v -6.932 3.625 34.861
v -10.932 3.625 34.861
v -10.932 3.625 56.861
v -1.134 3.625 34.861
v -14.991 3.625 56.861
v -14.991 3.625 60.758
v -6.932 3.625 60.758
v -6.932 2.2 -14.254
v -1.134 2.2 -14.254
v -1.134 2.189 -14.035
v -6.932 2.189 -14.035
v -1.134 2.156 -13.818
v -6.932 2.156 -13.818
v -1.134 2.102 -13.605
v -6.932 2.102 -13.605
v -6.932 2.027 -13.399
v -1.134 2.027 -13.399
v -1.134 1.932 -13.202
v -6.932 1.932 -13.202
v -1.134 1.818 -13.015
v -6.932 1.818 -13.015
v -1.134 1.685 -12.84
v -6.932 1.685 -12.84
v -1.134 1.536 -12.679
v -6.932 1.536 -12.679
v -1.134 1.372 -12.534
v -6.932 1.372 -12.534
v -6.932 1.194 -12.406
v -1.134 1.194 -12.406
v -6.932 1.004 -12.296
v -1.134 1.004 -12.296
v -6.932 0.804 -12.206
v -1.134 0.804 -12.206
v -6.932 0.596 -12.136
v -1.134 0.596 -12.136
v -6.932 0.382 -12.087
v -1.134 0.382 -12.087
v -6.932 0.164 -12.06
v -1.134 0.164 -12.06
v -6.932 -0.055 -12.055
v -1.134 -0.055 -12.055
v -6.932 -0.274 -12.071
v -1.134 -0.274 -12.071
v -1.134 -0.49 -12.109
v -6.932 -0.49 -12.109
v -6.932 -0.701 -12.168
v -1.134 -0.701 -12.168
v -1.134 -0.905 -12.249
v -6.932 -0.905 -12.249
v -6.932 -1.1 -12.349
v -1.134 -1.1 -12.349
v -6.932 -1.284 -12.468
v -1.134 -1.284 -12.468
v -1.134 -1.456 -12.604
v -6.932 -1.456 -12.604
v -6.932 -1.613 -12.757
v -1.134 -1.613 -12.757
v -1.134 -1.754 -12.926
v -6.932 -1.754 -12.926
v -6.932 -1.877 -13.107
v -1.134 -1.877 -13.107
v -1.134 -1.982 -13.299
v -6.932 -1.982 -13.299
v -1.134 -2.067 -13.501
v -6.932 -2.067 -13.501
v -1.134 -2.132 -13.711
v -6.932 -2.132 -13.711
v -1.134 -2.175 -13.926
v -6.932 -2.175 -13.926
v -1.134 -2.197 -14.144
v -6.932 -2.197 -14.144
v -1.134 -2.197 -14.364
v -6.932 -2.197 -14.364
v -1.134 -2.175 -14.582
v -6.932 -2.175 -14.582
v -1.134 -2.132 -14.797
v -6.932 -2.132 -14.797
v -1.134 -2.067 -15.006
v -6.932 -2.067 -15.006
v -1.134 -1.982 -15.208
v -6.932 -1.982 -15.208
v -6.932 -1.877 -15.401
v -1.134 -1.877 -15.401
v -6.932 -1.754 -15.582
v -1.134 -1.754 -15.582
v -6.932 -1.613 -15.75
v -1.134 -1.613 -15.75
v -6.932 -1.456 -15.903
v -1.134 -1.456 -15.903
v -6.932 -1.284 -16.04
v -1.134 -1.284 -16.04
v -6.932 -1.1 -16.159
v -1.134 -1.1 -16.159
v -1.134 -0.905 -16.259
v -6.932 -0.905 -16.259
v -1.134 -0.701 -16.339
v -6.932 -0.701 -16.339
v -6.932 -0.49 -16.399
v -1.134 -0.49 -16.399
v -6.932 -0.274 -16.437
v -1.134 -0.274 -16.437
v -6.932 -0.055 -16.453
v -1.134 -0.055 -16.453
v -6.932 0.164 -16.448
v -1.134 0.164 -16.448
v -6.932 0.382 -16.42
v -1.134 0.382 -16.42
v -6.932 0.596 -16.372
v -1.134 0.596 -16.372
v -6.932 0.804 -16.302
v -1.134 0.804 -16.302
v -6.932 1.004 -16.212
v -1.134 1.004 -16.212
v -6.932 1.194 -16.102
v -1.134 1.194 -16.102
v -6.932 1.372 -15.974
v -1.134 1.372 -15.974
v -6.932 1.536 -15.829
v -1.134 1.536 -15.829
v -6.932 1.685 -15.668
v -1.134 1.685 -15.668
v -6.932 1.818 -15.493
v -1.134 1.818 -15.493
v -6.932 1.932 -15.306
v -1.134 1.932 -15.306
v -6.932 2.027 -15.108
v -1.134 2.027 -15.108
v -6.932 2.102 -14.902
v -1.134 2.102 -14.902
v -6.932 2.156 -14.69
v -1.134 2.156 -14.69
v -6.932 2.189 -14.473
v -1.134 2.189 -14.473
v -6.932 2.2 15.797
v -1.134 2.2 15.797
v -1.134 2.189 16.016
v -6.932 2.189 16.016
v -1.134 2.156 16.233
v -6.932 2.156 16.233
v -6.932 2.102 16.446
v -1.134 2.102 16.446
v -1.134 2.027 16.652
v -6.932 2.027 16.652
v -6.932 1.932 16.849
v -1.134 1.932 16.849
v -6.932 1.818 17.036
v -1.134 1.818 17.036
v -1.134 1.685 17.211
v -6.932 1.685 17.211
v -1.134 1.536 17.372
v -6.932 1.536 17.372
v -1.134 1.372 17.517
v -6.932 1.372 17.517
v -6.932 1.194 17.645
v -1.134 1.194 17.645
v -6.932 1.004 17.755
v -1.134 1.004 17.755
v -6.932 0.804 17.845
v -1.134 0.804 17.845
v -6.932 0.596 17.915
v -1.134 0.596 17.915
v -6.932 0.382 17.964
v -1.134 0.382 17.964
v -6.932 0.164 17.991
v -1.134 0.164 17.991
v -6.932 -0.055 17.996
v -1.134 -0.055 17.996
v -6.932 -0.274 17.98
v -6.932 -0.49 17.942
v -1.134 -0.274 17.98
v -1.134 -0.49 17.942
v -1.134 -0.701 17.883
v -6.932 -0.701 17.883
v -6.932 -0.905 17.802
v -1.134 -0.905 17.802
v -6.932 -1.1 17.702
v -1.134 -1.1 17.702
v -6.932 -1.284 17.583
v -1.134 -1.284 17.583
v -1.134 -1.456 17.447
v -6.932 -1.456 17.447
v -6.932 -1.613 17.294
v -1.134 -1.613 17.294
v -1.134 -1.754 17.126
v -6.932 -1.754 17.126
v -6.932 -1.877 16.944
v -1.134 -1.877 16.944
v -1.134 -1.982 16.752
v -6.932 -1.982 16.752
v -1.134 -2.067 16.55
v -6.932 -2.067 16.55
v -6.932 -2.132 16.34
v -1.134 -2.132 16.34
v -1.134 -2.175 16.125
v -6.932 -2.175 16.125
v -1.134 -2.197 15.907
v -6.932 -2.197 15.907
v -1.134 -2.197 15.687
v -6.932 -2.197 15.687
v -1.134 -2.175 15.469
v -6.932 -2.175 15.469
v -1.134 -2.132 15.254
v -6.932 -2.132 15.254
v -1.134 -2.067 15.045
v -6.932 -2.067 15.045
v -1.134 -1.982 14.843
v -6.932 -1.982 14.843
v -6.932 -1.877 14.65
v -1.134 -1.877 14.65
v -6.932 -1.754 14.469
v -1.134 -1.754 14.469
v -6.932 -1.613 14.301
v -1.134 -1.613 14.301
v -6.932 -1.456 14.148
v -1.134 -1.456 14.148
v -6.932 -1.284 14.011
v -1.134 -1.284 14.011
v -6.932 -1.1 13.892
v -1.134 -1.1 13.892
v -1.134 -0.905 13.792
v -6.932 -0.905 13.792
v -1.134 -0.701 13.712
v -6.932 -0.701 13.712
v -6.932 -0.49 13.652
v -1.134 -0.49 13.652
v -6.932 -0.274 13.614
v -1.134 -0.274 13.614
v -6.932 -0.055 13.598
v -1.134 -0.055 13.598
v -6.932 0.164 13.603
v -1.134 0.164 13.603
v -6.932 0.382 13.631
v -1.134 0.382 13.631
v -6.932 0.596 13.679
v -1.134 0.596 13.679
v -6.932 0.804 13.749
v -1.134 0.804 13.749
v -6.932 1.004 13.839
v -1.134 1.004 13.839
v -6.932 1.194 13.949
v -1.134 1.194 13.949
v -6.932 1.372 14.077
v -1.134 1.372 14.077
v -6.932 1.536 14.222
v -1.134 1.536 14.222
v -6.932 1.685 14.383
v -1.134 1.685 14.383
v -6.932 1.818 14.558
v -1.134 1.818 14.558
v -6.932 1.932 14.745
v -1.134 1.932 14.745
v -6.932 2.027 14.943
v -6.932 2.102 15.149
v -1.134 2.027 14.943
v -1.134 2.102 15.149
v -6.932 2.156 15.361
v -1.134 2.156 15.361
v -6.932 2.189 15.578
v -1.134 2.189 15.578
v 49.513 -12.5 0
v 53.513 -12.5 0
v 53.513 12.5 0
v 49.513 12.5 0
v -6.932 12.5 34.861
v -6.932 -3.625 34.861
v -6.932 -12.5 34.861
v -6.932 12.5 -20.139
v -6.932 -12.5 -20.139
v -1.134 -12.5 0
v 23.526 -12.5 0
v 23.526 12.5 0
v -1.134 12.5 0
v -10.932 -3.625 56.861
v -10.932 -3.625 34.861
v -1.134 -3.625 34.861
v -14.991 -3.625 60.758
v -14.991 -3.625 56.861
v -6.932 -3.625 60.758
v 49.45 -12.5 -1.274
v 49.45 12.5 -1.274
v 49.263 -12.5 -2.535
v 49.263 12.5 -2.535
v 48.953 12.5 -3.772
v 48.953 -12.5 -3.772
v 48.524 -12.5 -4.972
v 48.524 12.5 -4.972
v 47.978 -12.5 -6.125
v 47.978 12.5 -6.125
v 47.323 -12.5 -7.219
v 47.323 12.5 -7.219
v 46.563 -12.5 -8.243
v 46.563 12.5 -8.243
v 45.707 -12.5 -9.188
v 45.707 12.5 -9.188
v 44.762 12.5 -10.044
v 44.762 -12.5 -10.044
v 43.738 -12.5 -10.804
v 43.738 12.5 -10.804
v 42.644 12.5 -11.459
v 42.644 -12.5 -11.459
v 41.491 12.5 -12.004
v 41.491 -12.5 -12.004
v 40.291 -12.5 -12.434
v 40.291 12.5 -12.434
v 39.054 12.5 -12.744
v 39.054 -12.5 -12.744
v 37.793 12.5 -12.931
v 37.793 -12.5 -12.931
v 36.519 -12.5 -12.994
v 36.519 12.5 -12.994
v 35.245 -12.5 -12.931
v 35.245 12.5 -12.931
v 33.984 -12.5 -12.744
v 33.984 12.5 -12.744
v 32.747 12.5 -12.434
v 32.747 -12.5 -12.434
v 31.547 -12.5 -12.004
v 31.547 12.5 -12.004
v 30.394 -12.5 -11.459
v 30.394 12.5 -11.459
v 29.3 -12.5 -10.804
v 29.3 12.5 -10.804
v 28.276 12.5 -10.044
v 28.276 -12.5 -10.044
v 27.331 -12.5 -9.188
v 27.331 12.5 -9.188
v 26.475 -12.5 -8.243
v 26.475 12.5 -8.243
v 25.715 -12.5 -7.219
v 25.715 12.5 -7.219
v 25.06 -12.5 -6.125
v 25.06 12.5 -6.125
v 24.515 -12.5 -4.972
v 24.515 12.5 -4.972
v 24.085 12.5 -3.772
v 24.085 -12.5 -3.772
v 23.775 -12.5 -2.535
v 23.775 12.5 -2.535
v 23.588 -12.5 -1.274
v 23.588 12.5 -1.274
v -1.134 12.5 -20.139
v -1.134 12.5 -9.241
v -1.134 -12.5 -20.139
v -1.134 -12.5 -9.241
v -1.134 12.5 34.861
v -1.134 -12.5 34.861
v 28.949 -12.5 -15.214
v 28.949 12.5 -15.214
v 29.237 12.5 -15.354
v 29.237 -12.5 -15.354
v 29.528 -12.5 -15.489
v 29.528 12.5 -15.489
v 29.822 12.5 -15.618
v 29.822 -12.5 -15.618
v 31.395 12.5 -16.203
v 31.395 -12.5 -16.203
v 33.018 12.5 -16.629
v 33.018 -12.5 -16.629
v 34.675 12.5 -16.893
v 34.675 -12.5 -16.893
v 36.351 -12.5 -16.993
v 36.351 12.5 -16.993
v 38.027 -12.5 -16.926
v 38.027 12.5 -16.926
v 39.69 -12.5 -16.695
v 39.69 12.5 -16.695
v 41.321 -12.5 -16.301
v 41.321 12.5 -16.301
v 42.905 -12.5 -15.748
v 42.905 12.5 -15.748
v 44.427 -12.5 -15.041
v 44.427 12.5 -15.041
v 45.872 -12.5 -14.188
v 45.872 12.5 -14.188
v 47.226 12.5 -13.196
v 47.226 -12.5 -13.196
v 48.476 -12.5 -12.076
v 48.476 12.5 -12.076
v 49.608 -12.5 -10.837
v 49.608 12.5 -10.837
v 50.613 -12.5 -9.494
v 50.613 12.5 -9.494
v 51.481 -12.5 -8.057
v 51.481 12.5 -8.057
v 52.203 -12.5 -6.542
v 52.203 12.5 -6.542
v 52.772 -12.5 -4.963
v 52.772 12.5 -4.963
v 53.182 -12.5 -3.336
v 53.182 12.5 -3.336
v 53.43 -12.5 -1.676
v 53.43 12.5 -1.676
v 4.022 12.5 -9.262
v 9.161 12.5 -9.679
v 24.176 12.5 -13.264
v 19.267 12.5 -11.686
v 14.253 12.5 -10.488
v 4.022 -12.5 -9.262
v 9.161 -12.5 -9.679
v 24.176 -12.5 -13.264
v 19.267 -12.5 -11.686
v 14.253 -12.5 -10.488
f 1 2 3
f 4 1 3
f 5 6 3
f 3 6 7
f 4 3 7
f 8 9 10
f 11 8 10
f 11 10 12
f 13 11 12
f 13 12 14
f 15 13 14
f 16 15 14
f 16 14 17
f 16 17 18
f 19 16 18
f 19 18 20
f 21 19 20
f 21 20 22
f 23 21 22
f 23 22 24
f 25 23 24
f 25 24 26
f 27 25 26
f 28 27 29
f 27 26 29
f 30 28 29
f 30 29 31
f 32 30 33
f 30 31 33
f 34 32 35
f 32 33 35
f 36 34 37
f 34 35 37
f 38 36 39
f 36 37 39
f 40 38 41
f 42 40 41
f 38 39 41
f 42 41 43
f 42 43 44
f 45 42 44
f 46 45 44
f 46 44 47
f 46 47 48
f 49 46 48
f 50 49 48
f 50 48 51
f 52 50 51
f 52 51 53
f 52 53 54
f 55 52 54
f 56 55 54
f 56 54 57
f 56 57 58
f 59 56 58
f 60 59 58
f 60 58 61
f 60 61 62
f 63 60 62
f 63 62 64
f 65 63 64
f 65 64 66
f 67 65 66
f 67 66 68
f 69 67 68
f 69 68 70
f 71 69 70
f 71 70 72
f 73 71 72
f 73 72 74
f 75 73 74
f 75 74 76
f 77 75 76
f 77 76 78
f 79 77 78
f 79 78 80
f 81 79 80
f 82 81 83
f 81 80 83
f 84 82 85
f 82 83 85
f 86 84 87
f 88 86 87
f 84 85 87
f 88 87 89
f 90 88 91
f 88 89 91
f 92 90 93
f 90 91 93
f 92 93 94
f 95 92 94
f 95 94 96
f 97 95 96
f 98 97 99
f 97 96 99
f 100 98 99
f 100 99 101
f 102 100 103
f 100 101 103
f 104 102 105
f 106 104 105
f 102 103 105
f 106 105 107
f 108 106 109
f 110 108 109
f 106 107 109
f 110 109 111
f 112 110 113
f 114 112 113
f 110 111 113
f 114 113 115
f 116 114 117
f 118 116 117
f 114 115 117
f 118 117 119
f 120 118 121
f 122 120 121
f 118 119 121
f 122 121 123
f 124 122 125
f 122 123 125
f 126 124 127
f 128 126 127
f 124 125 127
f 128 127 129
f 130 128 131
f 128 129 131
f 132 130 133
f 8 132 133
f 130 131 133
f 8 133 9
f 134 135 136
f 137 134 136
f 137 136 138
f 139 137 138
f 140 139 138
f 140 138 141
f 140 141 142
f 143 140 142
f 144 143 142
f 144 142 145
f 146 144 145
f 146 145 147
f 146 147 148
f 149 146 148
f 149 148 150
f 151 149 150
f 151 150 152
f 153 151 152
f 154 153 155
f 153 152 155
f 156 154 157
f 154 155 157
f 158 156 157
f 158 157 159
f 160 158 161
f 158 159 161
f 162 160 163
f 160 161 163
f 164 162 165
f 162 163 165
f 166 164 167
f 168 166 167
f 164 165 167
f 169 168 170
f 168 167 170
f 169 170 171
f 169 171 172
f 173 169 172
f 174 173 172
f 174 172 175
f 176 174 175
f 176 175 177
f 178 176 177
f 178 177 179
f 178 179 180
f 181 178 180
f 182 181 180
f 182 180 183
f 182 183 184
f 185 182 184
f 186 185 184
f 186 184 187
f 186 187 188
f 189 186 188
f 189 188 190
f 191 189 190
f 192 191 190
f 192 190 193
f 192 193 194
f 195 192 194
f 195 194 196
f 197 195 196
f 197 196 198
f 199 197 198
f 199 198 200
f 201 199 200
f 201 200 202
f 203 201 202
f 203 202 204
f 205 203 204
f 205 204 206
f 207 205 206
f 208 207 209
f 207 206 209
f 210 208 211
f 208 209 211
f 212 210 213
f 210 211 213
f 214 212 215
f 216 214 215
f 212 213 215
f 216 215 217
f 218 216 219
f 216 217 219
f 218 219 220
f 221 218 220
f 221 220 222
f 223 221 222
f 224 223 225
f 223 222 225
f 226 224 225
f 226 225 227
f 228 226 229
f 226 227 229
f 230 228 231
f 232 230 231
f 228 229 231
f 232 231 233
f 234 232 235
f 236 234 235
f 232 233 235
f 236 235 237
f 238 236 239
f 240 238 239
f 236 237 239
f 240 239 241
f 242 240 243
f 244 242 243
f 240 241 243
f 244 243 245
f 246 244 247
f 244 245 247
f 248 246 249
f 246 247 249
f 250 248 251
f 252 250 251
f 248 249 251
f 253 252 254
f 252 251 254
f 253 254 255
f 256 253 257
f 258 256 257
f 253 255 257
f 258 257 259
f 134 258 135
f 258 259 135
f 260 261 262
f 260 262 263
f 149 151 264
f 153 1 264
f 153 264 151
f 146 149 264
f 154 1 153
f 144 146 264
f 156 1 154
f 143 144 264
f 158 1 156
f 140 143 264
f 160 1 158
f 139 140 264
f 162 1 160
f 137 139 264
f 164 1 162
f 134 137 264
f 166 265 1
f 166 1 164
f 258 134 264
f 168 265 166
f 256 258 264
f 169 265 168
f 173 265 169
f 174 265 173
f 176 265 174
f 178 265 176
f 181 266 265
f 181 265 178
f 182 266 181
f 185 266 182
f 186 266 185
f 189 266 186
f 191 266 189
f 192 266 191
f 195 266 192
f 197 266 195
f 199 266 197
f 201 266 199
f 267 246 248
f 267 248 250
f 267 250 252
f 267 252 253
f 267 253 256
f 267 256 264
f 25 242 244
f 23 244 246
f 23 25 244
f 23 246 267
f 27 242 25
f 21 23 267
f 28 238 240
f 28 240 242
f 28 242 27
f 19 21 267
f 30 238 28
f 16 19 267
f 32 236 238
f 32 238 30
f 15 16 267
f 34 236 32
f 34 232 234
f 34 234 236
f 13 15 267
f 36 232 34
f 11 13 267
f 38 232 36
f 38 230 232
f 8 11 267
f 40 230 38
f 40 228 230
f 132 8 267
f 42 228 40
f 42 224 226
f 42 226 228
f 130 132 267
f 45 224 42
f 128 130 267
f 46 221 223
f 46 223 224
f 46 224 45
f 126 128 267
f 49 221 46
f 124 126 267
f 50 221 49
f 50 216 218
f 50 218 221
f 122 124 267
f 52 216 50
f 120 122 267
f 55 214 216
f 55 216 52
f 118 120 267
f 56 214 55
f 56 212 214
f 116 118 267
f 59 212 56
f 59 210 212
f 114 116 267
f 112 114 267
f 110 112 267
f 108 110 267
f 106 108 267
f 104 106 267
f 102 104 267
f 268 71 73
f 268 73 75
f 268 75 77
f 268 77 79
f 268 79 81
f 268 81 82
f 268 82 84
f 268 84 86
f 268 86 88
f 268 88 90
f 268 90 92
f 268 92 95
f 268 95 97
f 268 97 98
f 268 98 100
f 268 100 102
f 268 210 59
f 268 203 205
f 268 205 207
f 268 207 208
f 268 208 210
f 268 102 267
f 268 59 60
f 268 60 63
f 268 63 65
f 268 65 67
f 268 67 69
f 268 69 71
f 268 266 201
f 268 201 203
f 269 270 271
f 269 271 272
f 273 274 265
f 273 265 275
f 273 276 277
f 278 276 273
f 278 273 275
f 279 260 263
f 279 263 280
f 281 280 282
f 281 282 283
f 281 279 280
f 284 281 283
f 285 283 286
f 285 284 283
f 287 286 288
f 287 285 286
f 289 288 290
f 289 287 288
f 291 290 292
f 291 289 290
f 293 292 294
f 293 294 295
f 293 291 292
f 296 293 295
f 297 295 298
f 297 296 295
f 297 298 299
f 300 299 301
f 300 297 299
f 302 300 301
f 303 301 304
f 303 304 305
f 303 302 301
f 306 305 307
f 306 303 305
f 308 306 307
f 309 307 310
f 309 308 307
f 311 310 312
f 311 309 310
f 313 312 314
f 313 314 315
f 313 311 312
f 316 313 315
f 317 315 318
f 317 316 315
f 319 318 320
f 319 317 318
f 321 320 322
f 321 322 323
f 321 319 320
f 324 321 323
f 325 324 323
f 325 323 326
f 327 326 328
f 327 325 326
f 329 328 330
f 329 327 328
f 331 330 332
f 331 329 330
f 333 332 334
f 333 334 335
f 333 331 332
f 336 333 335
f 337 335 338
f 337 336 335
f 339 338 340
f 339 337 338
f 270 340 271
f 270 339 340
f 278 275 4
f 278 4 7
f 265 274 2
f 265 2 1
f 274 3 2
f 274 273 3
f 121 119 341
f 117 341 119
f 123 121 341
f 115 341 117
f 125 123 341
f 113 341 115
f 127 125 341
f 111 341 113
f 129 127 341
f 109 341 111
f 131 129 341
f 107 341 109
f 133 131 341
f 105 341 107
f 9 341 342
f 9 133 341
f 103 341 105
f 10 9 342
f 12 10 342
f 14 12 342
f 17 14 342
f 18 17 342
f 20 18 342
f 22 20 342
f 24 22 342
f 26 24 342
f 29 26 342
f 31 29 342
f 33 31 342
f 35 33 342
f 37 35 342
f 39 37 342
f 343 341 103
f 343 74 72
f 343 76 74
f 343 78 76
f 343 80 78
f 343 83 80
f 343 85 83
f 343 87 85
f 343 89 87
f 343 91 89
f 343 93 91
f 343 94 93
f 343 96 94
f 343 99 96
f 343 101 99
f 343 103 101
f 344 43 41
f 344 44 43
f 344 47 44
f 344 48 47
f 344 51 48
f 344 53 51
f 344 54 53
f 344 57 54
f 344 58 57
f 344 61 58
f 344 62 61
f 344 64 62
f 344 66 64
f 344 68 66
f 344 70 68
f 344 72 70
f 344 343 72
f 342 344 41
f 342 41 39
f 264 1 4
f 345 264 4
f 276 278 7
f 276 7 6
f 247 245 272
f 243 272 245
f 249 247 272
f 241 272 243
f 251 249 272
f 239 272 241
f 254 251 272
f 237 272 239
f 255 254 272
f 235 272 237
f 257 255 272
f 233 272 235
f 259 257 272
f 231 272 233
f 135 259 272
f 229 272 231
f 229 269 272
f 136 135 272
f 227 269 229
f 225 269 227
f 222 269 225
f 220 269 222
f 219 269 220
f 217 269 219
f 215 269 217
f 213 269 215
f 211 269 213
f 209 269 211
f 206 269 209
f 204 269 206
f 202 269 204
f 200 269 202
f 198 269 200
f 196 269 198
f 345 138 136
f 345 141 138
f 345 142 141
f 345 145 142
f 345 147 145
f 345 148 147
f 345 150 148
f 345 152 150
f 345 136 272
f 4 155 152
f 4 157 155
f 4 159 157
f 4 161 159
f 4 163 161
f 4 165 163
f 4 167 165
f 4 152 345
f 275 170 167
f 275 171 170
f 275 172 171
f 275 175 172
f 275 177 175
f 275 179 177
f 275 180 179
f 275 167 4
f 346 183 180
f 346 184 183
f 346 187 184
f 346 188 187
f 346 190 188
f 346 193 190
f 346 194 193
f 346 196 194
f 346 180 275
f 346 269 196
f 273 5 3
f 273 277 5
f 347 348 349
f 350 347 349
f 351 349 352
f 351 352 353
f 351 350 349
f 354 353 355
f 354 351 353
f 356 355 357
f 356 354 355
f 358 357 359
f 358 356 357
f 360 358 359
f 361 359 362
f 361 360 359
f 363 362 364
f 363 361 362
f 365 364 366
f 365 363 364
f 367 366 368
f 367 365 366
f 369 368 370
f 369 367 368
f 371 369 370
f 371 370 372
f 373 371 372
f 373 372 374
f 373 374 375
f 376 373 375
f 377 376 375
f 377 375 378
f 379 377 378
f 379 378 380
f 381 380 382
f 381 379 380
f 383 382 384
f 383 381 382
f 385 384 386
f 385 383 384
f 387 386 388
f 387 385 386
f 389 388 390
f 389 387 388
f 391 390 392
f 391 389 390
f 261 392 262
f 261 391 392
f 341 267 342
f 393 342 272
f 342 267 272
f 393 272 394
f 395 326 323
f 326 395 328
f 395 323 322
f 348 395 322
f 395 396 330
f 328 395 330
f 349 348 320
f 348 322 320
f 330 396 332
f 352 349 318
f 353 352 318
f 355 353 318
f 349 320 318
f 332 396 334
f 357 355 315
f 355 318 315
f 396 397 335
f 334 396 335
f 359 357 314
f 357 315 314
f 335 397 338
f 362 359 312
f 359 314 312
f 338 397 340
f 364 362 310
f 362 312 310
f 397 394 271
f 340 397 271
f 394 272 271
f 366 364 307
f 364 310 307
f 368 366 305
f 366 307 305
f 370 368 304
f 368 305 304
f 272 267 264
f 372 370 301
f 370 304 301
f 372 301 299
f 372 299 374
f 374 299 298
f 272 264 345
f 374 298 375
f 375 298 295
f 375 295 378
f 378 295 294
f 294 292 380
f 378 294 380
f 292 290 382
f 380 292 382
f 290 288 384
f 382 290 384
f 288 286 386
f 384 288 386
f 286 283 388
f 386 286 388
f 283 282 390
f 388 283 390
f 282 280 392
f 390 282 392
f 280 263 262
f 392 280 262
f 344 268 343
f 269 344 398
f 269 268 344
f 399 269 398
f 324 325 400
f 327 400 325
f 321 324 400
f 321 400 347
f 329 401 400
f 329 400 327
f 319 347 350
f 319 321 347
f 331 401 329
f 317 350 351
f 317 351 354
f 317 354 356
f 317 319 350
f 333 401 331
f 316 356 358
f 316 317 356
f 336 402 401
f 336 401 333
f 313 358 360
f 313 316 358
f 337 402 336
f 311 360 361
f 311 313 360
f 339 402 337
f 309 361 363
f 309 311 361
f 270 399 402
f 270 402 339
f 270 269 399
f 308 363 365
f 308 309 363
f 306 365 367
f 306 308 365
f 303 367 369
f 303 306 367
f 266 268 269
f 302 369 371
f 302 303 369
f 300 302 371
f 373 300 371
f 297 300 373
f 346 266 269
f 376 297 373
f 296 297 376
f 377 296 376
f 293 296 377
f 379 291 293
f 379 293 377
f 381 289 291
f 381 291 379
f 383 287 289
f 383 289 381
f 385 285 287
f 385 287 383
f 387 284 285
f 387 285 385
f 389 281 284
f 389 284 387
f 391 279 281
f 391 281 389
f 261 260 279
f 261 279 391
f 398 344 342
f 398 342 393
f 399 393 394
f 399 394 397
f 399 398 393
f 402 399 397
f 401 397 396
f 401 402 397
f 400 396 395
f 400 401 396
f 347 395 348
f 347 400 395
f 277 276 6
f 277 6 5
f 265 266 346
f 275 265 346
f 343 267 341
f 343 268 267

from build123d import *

# Parameters (mm, degrees)
F0_W     = 5.7972974144
F0_H     = 5.9
F0_H_2   = 19.1
F1_DEPTH = 12.5
F3_D     = 4.4
F3_DEPTH = 14.1
F3_TIP   = 1.3218933619
F4_DEPTH = 3.625


with BuildPart() as f1:
    # F0 (on Front) → F1 (new body, symmetric)
    with BuildSketch(Plane.XZ):
        with Locations((-4.0329019539, -17.188550967)):
            Rectangle(F0_W, F0_H)
        with BuildLine():
            ThreePointArc((29.8217841377, -15.618166969), (29.3859073845, -15.4145662467), (28.9485841576, -15.214091327))
            ThreePointArc((28.9485841576, -15.214091327), (29.3823237659, -15.4223103801), (29.8217841377, -15.618166969))
        make_face()
        with Locations((-4.0329019539, 25.311449033)):
            Rectangle(F0_W, F0_H_2)
        with BuildLine():
            Line((19.5255004201, 0), (-1.1342532467, 0))
            Line((-1.1342532467, 0), (-1.1342532467, -9.2409374192))
            ThreePointArc((-1.1342532467, -9.2409374192), (14.2525091884, -10.4882457176), (28.9485841576, -15.214091327))
            ThreePointArc((28.9485841576, -15.214091327), (22.072081358, -8.9479478378), (19.5255004201, 0))
        make_face()
        with BuildLine():
            Line((23.5255004201, 0), (19.5255004201, 0))
            ThreePointArc((19.5255004201, 0), (22.072081358, -8.9479478378), (28.9485841576, -15.214091327))
            ThreePointArc((28.9485841576, -15.214091327), (29.3859073845, -15.4145662467), (29.8217841377, -15.618166969))
            ThreePointArc((29.8217841377, -15.618166969), (45.8723890611, -14.1878546071), (53.5125784245, 0))
            Line((53.5125784245, 0), (49.5125784245, 0))
            ThreePointArc((49.5125784245, 0), (36.5190394223, -12.9935390022), (23.5255004201, 0))
        make_face()
        Polygon((-1.1342532467, 15.761449033), (-6.9315506611, 15.761449033), (-6.9315506611, -14.238550967), (-1.1342532467, -14.238550967), (-1.1342532467, -9.2409374192), (-1.1342532467, 0), align=None)
    extrude(amount=F1_DEPTH, both=True)

    # F3
    with Locations(Plane(origin=(-6.9315506611, 0, 0), x_dir=(0, -1, 0), z_dir=(-1, 0, 0))):
        with Locations((0, 15.79714939), (0, -14.253873378)):
            Hole(F3_D / 2, depth=F3_DEPTH)
            with Locations((0, 0, -(F3_DEPTH + F3_TIP / 2))):  # 118° drill point
                Cone(0, F3_D / 2, F3_TIP, mode=Mode.SUBTRACT)

    # F0 (on Front) → F4 (join, symmetric)
    with BuildSketch(Plane.XZ):
        Polygon((-10.9315506611, 34.861449033), (-6.9315506611, 34.861449033), (-1.1342532467, 34.861449033), (-6.9315506611, 60.7583903916), (-14.991494827, 60.7583903916), (-14.991494827, 56.861449033), (-10.9315506611, 56.861449033), align=None)
    extrude(amount=F4_DEPTH, both=True)


solid = f1.part
